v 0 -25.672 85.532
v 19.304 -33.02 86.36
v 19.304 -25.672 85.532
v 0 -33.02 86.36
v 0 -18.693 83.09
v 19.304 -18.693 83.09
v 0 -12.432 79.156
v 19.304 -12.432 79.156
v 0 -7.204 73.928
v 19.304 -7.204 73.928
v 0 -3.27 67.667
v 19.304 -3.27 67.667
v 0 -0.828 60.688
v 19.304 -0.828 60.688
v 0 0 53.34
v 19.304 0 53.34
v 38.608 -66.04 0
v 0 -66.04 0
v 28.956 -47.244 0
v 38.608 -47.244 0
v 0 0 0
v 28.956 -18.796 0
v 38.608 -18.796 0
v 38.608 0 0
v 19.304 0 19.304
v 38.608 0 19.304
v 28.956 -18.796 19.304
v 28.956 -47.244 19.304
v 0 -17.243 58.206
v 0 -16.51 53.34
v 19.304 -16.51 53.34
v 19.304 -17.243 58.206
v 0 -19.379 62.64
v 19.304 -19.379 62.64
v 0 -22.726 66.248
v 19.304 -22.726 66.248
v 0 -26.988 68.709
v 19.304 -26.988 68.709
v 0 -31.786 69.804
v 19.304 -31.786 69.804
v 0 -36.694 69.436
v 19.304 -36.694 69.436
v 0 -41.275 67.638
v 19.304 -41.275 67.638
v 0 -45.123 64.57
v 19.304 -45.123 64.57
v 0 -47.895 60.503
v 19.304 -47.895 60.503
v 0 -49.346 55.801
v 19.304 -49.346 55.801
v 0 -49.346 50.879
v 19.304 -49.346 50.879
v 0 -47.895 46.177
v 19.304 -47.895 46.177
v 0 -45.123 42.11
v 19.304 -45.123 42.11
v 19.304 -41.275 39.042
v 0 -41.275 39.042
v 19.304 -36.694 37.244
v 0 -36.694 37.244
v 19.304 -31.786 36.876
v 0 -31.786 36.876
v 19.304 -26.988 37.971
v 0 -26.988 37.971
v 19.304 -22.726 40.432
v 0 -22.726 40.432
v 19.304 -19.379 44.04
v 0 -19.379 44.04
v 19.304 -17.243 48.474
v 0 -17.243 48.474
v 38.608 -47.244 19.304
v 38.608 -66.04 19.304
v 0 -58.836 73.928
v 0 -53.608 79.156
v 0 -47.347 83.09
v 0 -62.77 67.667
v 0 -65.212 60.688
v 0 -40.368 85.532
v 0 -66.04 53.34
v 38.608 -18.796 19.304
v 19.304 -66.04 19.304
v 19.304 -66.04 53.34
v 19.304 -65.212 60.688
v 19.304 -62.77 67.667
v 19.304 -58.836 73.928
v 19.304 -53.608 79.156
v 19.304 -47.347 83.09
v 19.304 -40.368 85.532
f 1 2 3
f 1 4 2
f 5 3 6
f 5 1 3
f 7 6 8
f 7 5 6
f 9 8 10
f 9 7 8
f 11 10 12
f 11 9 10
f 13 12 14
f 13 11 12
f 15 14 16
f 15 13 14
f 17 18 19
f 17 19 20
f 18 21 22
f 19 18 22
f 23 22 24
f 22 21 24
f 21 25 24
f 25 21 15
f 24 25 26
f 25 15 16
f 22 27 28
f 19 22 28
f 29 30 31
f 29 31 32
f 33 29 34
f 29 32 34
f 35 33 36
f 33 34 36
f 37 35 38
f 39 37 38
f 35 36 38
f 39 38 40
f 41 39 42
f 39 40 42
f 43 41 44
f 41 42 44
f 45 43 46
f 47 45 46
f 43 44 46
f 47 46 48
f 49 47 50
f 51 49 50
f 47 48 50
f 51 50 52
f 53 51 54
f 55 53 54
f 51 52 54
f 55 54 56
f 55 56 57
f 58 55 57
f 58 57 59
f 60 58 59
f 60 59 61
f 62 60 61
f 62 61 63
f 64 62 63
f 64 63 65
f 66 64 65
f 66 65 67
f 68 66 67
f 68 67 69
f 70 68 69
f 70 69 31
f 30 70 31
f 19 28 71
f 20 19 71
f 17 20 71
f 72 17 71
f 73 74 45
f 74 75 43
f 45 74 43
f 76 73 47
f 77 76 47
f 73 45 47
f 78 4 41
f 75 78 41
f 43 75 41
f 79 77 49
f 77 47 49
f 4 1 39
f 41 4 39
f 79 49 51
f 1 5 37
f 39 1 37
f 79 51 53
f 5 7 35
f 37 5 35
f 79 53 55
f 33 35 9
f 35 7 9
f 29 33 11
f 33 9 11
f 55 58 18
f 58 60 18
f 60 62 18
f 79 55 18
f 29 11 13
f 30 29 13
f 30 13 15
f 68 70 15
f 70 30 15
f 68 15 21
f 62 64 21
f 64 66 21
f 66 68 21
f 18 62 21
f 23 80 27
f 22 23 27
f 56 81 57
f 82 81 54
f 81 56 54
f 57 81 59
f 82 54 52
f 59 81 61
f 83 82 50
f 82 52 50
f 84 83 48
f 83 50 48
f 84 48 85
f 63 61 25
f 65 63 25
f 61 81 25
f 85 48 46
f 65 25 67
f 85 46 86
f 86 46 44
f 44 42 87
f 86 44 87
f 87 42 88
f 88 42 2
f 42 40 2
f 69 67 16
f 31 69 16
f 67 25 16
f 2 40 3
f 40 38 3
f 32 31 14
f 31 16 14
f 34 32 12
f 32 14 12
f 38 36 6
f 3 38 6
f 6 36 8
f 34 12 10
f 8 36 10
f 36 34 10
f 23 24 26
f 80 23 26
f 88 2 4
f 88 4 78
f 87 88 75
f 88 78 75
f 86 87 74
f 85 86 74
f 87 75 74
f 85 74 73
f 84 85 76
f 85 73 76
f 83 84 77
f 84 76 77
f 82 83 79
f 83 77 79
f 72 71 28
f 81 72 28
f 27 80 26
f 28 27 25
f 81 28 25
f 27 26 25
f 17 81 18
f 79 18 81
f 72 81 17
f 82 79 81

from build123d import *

# Parameters (mm, degrees)
F1_DEPTH = 66.04
F2_R     = 33.02
F3_R     = 33.01999
F4_R     = 16.51
F5_DEPTH = 34.544
F7_DEPTH = 25.4


# Not quite as in the source:
# - a fillet or chamfer is up to 0.001 mm smaller than in the source, because OpenCascade refuses the exact size


with BuildPart() as f1:
    # F0 (on Front) → F1 (new body)
    with BuildSketch(Plane.XZ):
        Polygon((0, 86.36), (0, 0), (38.608, 0), (38.608, 19.304), (19.304, 19.304), (19.304, 86.36), align=None)
    extrude(amount=F1_DEPTH)

    # F2
    f2_edges = [f1.edges().sort_by_distance(p)[0] for p in [
        (9.652, 0, 86.36),
    ]]
    fillet(f2_edges, radius=F2_R)

    # F3 (radius 33.02 in the source; OpenCascade refuses exactly that, so slightly less here)
    f3_edges = [f1.edges().sort_by_distance(p)[0] for p in [
        (9.652, -66.04, 86.36),
    ]]
    fillet(f3_edges, radius=F3_R)

    # F4 (on face) → F5 (cut)
    with BuildSketch(Plane.YZ.offset(19.304)):
        with Locations((-33.02, 53.34)):
            Circle(F4_R)
    extrude(amount=-F5_DEPTH, mode=Mode.SUBTRACT)

    # F6 (on face) → F7 (cut)
    with BuildSketch(Plane.XY.offset(19.304)):
        Polygon((38.608, -47.244), (38.608, -33.02), (38.608, -18.796), (28.956, -18.796), (28.956, -47.244), align=None)
    extrude(amount=-F7_DEPTH, mode=Mode.SUBTRACT)


solid = f1.part
